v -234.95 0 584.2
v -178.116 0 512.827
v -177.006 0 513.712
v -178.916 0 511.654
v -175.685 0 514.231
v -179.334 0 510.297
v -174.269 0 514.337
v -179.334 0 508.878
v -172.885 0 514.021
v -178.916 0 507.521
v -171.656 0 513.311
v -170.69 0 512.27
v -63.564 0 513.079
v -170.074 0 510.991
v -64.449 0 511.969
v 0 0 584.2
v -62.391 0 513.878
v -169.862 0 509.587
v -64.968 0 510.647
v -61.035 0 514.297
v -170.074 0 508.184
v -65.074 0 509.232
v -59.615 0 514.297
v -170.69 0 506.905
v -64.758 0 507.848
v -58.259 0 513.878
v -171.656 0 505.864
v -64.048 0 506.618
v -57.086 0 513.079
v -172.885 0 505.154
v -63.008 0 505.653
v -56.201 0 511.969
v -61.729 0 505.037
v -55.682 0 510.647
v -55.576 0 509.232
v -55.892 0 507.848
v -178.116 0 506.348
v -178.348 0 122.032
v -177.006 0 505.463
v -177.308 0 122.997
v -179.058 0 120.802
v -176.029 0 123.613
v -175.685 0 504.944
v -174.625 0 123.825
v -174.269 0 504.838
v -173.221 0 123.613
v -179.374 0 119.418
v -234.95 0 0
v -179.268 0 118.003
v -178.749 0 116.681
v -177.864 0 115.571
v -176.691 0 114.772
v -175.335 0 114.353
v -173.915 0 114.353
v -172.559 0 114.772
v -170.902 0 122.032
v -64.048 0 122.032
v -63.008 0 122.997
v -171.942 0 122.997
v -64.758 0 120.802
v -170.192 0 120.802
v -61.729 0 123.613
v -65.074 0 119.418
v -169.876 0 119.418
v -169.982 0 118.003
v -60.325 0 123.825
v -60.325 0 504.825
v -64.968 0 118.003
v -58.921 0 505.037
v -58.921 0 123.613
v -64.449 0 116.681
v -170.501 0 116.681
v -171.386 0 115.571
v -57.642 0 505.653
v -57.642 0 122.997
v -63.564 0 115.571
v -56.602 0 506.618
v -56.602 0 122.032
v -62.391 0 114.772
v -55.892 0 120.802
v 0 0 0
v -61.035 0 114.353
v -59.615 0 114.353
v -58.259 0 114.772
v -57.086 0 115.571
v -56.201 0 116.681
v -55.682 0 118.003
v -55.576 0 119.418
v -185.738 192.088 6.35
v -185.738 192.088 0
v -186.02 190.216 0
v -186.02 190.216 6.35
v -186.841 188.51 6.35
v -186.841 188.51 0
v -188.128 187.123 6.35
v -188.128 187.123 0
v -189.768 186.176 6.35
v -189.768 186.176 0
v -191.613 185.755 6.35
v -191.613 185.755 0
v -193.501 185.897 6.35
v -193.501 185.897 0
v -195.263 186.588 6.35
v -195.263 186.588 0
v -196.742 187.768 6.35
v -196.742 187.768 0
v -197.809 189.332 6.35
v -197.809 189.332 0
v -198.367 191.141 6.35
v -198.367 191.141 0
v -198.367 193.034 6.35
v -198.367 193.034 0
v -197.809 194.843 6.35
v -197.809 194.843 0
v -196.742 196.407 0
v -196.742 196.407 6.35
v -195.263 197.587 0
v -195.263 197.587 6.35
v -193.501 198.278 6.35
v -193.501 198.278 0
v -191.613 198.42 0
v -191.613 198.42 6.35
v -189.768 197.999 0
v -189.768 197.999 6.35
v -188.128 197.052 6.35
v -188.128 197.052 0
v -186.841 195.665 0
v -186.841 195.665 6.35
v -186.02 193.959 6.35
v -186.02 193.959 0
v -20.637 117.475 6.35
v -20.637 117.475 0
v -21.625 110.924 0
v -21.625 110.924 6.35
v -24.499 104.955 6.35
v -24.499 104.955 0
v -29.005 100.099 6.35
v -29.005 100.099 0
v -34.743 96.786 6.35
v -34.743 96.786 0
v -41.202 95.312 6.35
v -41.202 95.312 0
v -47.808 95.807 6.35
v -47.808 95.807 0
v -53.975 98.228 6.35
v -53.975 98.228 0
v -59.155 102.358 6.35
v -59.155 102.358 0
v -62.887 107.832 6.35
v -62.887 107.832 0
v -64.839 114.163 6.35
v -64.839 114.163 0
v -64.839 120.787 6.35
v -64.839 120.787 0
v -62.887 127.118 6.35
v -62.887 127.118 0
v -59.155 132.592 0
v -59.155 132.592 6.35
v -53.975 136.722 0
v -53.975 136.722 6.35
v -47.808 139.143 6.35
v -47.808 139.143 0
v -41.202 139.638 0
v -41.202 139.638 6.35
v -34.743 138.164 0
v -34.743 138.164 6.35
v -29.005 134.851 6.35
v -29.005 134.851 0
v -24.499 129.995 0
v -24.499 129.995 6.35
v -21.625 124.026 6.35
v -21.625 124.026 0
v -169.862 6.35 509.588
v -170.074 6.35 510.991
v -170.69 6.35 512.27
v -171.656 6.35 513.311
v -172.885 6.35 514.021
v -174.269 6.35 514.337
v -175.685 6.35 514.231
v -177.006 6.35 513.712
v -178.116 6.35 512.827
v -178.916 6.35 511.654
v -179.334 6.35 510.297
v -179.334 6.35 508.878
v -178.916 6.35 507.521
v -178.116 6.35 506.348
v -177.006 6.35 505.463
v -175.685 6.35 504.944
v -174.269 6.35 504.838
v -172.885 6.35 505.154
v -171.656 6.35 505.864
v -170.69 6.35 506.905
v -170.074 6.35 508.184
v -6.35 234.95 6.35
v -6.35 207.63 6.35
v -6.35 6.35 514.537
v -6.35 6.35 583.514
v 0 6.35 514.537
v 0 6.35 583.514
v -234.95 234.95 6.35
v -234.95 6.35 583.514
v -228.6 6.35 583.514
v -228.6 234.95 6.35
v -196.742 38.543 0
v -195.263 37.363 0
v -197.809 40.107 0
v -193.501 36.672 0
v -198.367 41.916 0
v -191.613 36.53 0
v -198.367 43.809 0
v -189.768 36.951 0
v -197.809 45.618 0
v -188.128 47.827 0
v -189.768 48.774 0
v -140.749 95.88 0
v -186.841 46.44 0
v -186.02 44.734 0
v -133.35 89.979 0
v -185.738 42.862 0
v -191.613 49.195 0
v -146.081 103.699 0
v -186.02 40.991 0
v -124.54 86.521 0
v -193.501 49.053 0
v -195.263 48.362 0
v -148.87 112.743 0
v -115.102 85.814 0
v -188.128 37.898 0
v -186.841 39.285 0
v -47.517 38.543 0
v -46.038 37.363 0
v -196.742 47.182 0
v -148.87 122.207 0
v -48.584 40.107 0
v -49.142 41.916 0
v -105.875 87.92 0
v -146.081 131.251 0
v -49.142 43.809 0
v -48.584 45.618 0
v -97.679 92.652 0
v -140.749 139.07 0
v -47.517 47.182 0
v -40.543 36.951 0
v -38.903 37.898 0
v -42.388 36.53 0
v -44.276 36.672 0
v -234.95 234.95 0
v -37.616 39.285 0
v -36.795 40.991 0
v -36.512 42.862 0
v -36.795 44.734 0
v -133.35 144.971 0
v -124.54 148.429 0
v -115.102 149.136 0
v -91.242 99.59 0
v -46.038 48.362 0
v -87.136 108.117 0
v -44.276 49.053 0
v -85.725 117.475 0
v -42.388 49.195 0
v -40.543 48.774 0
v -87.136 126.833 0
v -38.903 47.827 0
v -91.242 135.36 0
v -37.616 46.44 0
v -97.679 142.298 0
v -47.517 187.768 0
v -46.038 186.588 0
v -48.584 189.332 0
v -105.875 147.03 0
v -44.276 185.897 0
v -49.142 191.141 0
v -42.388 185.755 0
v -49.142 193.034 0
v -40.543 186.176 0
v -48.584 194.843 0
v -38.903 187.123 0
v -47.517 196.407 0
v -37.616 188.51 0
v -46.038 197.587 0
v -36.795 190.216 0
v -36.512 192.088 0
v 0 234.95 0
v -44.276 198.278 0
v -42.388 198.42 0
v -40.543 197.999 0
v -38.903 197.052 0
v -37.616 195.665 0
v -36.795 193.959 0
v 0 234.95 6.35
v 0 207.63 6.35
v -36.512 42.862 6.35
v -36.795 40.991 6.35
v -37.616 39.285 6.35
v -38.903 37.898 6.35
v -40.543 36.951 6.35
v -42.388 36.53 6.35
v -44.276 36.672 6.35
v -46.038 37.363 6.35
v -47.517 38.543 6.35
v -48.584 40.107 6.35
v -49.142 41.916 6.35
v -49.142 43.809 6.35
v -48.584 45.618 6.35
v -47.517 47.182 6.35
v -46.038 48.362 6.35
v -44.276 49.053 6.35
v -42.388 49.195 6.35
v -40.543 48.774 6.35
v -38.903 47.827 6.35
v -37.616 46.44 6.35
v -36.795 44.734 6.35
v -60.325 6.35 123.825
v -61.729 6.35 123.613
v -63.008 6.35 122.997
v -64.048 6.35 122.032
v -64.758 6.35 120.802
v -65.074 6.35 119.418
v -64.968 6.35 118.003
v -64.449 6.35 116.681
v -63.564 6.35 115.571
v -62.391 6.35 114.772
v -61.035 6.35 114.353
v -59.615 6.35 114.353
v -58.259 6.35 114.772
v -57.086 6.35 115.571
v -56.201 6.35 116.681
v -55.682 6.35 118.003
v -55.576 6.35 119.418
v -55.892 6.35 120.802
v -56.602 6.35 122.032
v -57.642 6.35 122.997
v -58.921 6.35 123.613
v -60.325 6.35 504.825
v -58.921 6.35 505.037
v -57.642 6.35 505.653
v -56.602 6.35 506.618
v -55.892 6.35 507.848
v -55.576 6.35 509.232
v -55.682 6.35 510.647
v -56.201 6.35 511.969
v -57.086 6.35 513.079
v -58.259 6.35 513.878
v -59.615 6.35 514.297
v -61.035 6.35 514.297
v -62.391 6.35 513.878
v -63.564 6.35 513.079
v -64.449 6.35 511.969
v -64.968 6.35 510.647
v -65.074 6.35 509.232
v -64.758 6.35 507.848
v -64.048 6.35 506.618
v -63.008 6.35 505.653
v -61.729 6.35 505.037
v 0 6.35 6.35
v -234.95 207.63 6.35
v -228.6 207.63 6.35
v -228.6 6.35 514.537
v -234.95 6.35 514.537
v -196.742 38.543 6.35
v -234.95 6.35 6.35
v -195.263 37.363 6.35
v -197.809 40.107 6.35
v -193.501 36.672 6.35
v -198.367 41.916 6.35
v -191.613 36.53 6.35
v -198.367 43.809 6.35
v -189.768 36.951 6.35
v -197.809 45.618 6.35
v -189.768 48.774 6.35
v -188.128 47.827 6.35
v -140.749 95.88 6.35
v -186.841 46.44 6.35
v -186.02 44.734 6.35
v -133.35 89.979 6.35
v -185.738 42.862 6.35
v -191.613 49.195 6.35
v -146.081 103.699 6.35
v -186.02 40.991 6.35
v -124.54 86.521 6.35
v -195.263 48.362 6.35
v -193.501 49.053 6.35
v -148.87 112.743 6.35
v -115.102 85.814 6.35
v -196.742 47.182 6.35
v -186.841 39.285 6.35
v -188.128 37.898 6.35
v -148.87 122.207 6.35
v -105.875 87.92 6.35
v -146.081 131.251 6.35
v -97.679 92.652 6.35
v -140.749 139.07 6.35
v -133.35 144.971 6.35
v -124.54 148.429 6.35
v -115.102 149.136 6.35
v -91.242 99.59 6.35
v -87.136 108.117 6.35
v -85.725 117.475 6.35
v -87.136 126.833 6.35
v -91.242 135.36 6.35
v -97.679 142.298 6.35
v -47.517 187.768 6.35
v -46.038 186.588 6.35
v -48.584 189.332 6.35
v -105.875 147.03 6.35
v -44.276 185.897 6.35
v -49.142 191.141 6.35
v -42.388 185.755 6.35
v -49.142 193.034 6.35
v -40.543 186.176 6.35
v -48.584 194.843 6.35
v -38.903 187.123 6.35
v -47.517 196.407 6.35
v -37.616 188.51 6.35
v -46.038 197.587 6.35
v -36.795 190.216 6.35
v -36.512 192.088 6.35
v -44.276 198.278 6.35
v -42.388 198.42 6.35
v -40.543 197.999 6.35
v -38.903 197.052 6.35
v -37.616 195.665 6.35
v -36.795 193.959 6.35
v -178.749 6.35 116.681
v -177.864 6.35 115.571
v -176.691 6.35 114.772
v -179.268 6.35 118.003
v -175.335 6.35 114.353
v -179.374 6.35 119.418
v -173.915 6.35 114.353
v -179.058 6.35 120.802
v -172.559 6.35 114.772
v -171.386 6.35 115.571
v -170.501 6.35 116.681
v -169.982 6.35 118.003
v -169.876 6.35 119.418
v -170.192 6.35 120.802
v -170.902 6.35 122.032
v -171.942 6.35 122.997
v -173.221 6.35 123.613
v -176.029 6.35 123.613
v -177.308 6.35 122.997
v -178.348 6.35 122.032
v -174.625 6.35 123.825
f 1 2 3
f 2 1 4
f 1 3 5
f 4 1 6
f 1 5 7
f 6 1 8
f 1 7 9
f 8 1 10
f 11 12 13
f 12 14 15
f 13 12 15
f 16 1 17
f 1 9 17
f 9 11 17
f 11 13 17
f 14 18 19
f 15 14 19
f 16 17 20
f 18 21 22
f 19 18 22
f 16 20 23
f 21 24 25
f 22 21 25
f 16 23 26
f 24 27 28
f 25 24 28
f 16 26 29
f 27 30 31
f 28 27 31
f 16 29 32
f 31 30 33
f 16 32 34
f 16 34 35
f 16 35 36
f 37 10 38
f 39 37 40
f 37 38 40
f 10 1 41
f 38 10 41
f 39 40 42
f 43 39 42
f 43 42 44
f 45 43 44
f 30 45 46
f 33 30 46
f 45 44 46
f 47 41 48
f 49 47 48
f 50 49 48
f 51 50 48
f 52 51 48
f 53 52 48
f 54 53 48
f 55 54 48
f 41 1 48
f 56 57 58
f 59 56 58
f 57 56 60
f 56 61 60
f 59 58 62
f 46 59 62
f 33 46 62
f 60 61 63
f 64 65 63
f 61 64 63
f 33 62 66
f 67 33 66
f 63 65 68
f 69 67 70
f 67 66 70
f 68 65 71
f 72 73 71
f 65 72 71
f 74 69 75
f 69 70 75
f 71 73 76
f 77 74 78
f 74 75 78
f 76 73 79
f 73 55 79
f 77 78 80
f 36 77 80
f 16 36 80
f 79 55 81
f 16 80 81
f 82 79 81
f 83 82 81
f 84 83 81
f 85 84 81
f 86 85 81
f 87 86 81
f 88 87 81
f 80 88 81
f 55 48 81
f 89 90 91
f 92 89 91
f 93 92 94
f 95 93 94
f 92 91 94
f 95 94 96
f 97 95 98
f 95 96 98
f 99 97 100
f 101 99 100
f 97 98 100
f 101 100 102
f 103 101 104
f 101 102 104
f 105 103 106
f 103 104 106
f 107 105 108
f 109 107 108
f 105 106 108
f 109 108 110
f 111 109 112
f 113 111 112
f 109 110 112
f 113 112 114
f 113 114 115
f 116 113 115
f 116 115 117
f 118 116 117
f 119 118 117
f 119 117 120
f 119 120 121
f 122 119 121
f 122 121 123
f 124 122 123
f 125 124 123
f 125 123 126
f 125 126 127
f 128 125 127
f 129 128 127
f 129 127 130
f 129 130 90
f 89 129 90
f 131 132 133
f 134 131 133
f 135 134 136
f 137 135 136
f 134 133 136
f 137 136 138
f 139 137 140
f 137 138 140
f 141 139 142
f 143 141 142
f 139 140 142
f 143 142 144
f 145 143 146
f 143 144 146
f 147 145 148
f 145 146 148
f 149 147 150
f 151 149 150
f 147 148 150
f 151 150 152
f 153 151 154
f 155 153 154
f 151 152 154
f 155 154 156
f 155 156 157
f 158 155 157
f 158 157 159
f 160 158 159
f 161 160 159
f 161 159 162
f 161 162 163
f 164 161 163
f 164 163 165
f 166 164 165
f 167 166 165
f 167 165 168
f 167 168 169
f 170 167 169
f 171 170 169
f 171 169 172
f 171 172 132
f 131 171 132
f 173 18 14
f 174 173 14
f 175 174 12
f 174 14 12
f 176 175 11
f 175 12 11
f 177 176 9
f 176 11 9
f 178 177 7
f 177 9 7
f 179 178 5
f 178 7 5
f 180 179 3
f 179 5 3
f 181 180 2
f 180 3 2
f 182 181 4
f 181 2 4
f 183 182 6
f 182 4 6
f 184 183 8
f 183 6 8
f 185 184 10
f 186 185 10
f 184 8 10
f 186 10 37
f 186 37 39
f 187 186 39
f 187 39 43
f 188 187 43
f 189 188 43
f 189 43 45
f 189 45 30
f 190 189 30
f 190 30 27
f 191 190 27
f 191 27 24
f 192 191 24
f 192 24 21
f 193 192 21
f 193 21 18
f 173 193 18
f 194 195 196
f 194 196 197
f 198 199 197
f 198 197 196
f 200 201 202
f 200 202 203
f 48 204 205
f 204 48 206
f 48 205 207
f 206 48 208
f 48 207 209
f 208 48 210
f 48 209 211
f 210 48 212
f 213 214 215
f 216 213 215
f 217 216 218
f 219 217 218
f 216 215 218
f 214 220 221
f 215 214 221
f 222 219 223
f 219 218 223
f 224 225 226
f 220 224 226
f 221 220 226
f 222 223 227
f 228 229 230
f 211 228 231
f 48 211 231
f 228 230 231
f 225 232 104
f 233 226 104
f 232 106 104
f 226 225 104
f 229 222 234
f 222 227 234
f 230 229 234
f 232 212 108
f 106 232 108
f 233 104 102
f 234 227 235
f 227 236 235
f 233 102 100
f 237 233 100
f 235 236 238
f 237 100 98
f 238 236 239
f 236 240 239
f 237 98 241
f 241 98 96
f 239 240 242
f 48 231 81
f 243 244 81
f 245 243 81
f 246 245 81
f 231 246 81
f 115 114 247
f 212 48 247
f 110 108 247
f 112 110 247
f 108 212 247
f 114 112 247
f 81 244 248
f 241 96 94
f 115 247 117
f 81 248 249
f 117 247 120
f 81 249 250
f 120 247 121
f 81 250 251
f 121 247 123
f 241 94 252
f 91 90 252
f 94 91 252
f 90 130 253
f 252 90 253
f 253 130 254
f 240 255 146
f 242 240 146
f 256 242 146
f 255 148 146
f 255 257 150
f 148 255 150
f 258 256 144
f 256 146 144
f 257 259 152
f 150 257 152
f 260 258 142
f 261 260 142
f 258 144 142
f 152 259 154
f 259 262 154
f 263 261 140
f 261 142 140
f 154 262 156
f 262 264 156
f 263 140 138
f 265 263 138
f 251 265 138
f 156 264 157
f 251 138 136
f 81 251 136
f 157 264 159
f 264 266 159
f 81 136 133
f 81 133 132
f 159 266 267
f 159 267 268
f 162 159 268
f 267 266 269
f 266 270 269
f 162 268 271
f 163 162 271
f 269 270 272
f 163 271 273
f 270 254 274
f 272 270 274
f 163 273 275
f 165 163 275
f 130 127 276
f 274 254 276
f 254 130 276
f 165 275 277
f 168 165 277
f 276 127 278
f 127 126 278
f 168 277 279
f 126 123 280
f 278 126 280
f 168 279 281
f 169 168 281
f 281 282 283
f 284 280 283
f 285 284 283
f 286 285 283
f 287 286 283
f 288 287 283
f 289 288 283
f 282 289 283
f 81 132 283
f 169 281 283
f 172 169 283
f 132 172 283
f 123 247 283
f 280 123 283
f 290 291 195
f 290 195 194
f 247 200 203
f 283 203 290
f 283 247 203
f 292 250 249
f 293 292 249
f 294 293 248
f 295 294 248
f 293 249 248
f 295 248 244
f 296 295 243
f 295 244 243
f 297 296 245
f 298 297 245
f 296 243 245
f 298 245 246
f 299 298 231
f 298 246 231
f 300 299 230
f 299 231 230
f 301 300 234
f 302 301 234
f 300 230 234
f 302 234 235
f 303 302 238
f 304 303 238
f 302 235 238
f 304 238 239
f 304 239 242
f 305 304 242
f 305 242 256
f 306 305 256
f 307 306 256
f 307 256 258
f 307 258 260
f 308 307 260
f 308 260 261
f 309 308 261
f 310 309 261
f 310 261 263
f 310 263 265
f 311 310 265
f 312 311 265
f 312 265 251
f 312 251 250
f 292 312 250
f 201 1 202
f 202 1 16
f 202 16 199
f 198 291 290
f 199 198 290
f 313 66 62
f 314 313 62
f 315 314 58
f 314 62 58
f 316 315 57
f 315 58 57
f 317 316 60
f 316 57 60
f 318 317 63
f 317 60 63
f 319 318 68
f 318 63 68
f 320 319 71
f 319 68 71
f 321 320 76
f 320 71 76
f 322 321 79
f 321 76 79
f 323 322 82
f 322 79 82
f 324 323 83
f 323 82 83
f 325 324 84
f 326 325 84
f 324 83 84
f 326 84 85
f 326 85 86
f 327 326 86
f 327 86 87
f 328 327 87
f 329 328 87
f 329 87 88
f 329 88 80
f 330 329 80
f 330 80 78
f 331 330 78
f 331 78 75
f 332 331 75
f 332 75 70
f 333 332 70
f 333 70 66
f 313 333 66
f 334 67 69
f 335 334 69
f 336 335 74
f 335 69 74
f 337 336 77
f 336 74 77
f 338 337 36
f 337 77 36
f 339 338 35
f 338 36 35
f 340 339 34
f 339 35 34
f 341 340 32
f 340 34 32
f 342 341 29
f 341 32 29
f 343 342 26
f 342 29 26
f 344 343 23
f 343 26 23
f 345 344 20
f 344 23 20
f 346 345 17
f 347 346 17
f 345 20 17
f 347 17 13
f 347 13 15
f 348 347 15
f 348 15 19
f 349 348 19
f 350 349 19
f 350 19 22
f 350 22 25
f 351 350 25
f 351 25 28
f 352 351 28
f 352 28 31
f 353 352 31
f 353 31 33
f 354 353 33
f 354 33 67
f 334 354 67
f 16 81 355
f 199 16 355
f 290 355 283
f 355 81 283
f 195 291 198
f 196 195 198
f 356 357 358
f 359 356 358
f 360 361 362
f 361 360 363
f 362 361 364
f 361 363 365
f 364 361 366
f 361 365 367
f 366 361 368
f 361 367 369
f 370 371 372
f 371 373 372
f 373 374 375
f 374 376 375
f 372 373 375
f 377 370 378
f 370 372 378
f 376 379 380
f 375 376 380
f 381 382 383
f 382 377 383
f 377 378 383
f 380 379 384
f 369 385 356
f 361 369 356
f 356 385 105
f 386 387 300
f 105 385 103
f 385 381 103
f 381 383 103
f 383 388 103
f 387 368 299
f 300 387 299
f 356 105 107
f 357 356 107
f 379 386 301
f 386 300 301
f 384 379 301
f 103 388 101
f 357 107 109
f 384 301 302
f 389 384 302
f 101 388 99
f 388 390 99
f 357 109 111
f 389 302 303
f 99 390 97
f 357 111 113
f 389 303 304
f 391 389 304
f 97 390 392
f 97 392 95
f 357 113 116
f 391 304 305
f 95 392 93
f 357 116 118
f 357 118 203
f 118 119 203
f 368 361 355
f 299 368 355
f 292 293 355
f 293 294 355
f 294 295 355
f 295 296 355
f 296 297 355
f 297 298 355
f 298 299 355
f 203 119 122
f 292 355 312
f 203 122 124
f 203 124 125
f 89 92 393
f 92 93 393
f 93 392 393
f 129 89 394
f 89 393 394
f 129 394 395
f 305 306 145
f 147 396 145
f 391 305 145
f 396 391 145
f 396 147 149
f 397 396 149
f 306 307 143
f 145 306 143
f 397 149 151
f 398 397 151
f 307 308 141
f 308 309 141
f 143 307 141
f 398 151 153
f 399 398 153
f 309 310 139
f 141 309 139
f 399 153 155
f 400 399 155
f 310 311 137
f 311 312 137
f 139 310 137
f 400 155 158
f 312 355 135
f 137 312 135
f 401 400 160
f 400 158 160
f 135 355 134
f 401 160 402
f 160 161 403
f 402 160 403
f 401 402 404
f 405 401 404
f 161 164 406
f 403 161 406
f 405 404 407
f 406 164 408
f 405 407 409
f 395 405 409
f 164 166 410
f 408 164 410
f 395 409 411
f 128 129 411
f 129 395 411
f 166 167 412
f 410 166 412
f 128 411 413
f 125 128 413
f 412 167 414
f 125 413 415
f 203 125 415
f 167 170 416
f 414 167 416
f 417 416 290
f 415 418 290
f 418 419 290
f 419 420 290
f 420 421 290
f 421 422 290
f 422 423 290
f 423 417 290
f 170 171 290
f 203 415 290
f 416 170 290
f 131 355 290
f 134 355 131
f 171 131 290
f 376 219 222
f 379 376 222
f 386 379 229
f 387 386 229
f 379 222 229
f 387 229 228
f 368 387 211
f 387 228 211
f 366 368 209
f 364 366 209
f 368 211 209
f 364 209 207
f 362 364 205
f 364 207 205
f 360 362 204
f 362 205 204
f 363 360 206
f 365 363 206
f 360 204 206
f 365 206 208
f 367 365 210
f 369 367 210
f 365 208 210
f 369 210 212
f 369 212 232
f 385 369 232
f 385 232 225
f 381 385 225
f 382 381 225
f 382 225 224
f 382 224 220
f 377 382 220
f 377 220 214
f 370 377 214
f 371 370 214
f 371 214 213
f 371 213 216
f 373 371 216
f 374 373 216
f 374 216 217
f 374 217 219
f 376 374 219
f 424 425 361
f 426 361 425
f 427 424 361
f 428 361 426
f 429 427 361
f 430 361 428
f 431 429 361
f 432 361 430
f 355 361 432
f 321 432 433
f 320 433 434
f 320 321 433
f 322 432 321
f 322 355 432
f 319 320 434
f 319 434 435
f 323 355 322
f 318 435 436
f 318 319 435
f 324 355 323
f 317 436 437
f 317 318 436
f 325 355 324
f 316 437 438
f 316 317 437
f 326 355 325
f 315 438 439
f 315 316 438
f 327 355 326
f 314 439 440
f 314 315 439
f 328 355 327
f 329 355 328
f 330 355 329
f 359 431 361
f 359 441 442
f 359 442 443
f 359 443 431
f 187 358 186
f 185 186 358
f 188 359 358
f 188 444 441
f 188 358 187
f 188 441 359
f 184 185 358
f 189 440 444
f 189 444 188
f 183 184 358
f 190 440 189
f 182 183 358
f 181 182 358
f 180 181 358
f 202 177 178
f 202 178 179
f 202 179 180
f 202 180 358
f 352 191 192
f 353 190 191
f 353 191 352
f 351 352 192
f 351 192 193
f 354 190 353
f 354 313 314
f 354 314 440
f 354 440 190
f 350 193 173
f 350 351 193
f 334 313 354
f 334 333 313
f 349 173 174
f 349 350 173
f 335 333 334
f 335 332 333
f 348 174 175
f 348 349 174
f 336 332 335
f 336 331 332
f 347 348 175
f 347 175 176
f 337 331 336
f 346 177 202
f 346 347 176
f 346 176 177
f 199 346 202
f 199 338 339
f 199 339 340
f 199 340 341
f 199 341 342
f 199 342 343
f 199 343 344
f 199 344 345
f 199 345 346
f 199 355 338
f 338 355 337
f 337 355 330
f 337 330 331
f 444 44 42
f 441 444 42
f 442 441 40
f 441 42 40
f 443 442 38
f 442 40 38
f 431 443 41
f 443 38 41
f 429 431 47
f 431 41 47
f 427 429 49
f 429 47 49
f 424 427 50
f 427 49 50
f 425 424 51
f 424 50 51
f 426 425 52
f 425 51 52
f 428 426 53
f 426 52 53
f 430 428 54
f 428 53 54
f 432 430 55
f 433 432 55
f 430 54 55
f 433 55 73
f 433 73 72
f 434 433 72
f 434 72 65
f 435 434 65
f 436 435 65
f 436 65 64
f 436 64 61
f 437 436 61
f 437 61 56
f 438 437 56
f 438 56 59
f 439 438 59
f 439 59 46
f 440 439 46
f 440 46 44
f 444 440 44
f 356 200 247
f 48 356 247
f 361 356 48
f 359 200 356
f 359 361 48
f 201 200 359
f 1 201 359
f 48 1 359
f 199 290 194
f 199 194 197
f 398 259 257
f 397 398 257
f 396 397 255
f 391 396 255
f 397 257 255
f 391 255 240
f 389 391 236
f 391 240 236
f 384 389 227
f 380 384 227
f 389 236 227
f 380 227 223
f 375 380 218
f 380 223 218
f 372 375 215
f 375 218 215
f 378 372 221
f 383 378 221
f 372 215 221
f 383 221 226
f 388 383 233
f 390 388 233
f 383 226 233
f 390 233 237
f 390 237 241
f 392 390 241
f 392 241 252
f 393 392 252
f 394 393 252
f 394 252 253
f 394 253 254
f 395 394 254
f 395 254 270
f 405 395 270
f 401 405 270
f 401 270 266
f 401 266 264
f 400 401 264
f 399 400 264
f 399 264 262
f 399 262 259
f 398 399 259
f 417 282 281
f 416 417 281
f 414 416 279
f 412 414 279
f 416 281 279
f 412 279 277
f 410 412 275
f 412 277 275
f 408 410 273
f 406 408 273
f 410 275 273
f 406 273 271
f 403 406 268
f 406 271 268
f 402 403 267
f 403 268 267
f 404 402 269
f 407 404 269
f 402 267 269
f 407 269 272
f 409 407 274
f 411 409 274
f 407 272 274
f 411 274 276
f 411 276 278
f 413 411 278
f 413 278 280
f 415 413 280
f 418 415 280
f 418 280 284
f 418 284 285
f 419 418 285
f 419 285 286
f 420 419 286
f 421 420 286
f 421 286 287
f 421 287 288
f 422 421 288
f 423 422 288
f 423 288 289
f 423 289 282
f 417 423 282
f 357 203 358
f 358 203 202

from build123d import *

# Parameters (mm, degrees)
F0_W      = 234.95
F0_H      = 234.95
F1_DEPTH  = 584.2
F3_DEPTH  = 234.951
F5_DEPTH  = 25.4
F6_DEPTH  = 25.4
F7_W      = 439.5717488766
F7_H      = 605.656187439
F8_DEPTH  = 234.951
F10_DEPTH = 6.35
F12_DEPTH = 6.35
F13_R     = 6.35
F13_R_2   = 22.225
F13_R_3   = 31.75
F14_DEPTH = 584.201
F15_DEPTH = 25.4
F17_DEPTH = 234.951
F19_DEPTH = 234.951


with BuildPart() as f1:
    # F0 (on Top) → F1 (new body)
    with BuildSketch(Plane.XY):
        with Locations((-117.475, 117.475)):
            Rectangle(F0_W, F0_H)
    extrude(amount=F1_DEPTH)

    # F2 (on face) → F3 (cut, through all)
    with BuildSketch(Plane.YZ):
        Polygon((0, 584.2), (234.95, 558.8), (234.95, 584.2), align=None)
    extrude(amount=-F3_DEPTH, mode=Mode.SUBTRACT)

    # F4 (on face) → F5 (cut)
    with BuildSketch(Plane.XZ):
        with BuildLine():
            ThreePointArc((-55.5625, 119.0625), (-56.9574039546, 122.4300960454), (-60.325, 123.825))
            ThreePointArc((-60.325, 123.825), (-63.6925960454, 115.6949039546), (-55.5625, 119.0625))
        make_face()
        with BuildLine():
            ThreePointArc((-55.5625, 509.5875), (-60.325, 514.35), (-65.0875, 509.5875))
            Line((-65.0875, 509.5875), (-60.325, 509.5875))
            Line((-60.325, 509.5875), (-60.325, 504.825))
            ThreePointArc((-60.325, 504.825), (-56.9574039546, 506.2199039546), (-55.5625, 509.5875))
        make_face()
        with BuildLine():
            Line((-60.325, 509.5875), (-65.0875, 509.5875))
            ThreePointArc((-65.0875, 509.5875), (-63.6925960454, 506.2199039546), (-60.325, 504.825))
            Line((-60.325, 504.825), (-60.325, 509.5875))
        make_face()
        with BuildLine():
            ThreePointArc((-169.8625, 119.0625), (-171.2574039546, 122.4300960454), (-174.625, 123.825))
            ThreePointArc((-174.625, 123.825), (-177.9925960454, 115.6949039546), (-169.8625, 119.0625))
        make_face()
        with BuildLine():
            ThreePointArc((-174.625, 504.825), (-171.2574039546, 506.2199039546), (-169.8625, 509.5875))
            Line((-169.8625, 509.5875), (-174.625, 509.5875))
            Line((-174.625, 509.5875), (-174.625, 504.825))
        make_face()
        with BuildLine():
            Line((-174.625, 509.5875), (-169.8625, 509.5875))
            ThreePointArc((-169.8625, 509.5875), (-177.9925960454, 512.9550960454), (-174.625, 504.825))
            Line((-174.625, 504.825), (-174.625, 509.5875))
        make_face()
    extrude(amount=-F5_DEPTH, mode=Mode.SUBTRACT)

    # F4 (on face) → F6 (cut)
    with BuildSketch(Plane.XZ):
        with BuildLine():
            ThreePointArc((-55.5625, 119.0625), (-56.9574039546, 122.4300960454), (-60.325, 123.825))
            ThreePointArc((-60.325, 123.825), (-63.6925960454, 115.6949039546), (-55.5625, 119.0625))
        make_face()
        with BuildLine():
            ThreePointArc((-55.5625, 509.5875), (-60.325, 514.35), (-65.0875, 509.5875))
            Line((-65.0875, 509.5875), (-60.325, 509.5875))
            Line((-60.325, 509.5875), (-60.325, 504.825))
            ThreePointArc((-60.325, 504.825), (-56.9574039546, 506.2199039546), (-55.5625, 509.5875))
        make_face()
        with BuildLine():
            Line((-60.325, 509.5875), (-65.0875, 509.5875))
            ThreePointArc((-65.0875, 509.5875), (-63.6925960454, 506.2199039546), (-60.325, 504.825))
            Line((-60.325, 504.825), (-60.325, 509.5875))
        make_face()
        with BuildLine():
            ThreePointArc((-169.8625, 119.0625), (-171.2574039546, 122.4300960454), (-174.625, 123.825))
            ThreePointArc((-174.625, 123.825), (-177.9925960454, 115.6949039546), (-169.8625, 119.0625))
        make_face()
        with BuildLine():
            ThreePointArc((-174.625, 504.825), (-171.2574039546, 506.2199039546), (-169.8625, 509.5875))
            Line((-169.8625, 509.5875), (-174.625, 509.5875))
            Line((-174.625, 509.5875), (-174.625, 504.825))
        make_face()
        with BuildLine():
            Line((-174.625, 509.5875), (-169.8625, 509.5875))
            ThreePointArc((-169.8625, 509.5875), (-177.9925960454, 512.9550960454), (-174.625, 504.825))
            Line((-174.625, 504.825), (-174.625, 509.5875))
        make_face()
    extrude(amount=-F6_DEPTH, mode=Mode.SUBTRACT)

    # F7 (on face) → F8 (cut, through all)
    with BuildSketch(Plane.YZ):
        with Locations((226.1358744383, 309.1780937195)):
            Rectangle(F7_W, F7_H)
    extrude(amount=-F8_DEPTH, mode=Mode.SUBTRACT)

    # F11 (on face) → F12 (join)
    with BuildSketch(Plane(origin=(-234.95, 0, 0), x_dir=(0, -1, 0), z_dir=(-1, 0, 0))):
        Polygon((-6.35, 6.35), (-6.35, 583.5135135135), (-234.95, 6.35), align=None)
    extrude(amount=-F12_DEPTH)

    # F13 (on face) → F14 (cut, through all)
    with BuildSketch(Plane(origin=(0, 0, 0), x_dir=(1, 0, 0), z_dir=(0, 0, -1))):
        with Locations((-192.0875, -42.8625)):
            Circle(F13_R)
        with Locations((-42.8625, -42.8625)):
            Circle(F13_R)
        with Locations((-42.8625, -192.0875)):
            Circle(F13_R)
        with Locations((-192.0875, -192.0875)):
            Circle(F13_R)
        with Locations((-42.8625, -117.475)):
            Circle(F13_R_2)
        with Locations((-117.475, -117.475)):
            Circle(F13_R_3)
    extrude(amount=-F14_DEPTH, mode=Mode.SUBTRACT)

    # F13 (on face) → F15 (cut)
    with BuildSketch(Plane(origin=(0, 0, 0), x_dir=(1, 0, 0), z_dir=(0, 0, -1))):
        with Locations((-192.0875, -42.8625)):
            Circle(F13_R)
        with Locations((-42.8625, -42.8625)):
            Circle(F13_R)
        with Locations((-42.8625, -192.0875)):
            Circle(F13_R)
        with Locations((-192.0875, -192.0875)):
            Circle(F13_R)
        with Locations((-42.8625, -117.475)):
            Circle(F13_R_2)
        with Locations((-117.475, -117.475)):
            Circle(F13_R_3)
    extrude(amount=-F15_DEPTH, mode=Mode.SUBTRACT)


with BuildPart() as f10:
    # F9 (on face) → F10 (new body)
    with BuildSketch(Plane.YZ):
        Polygon((234.95, 6.35), (6.35, 583.5135135135), (6.35, 6.35), align=None)
    extrude(amount=-F10_DEPTH)


with BuildPart() as f17_tool:
    # F16 (on face) → F17 (new body, through all)
    with BuildSketch(Plane.YZ):
        Polygon((207.6302323857, 6.35), (97.0348650139, 285.5783937471), (6.35, 514.5372533882), (6.35, 6.35), align=None)
    extrude(amount=-F17_DEPTH)


with BuildPart() as f1_1:
    add(f1.part)

    # F17: cut by f17_tool
    add(f17_tool.part, mode=Mode.SUBTRACT)

    # F18 (on face) → F19 (cut, through all)
    with BuildSketch(Plane(origin=(-234.95, 0, 0), x_dir=(0, -1, 0), z_dir=(-1, 0, 0))):
        Polygon((-6.35, 514.5372533882), (-97.0348650139, 285.5783937471), (-207.6302323857, 6.35), (-6.35, 6.35), align=None)
    extrude(amount=-F19_DEPTH, mode=Mode.SUBTRACT)


with BuildPart() as f10_1:
    add(f10.part)

    # F17: cut by f17_tool
    add(f17_tool.part, mode=Mode.SUBTRACT)


solid = Compound([f1_1.part, f10_1.part])
